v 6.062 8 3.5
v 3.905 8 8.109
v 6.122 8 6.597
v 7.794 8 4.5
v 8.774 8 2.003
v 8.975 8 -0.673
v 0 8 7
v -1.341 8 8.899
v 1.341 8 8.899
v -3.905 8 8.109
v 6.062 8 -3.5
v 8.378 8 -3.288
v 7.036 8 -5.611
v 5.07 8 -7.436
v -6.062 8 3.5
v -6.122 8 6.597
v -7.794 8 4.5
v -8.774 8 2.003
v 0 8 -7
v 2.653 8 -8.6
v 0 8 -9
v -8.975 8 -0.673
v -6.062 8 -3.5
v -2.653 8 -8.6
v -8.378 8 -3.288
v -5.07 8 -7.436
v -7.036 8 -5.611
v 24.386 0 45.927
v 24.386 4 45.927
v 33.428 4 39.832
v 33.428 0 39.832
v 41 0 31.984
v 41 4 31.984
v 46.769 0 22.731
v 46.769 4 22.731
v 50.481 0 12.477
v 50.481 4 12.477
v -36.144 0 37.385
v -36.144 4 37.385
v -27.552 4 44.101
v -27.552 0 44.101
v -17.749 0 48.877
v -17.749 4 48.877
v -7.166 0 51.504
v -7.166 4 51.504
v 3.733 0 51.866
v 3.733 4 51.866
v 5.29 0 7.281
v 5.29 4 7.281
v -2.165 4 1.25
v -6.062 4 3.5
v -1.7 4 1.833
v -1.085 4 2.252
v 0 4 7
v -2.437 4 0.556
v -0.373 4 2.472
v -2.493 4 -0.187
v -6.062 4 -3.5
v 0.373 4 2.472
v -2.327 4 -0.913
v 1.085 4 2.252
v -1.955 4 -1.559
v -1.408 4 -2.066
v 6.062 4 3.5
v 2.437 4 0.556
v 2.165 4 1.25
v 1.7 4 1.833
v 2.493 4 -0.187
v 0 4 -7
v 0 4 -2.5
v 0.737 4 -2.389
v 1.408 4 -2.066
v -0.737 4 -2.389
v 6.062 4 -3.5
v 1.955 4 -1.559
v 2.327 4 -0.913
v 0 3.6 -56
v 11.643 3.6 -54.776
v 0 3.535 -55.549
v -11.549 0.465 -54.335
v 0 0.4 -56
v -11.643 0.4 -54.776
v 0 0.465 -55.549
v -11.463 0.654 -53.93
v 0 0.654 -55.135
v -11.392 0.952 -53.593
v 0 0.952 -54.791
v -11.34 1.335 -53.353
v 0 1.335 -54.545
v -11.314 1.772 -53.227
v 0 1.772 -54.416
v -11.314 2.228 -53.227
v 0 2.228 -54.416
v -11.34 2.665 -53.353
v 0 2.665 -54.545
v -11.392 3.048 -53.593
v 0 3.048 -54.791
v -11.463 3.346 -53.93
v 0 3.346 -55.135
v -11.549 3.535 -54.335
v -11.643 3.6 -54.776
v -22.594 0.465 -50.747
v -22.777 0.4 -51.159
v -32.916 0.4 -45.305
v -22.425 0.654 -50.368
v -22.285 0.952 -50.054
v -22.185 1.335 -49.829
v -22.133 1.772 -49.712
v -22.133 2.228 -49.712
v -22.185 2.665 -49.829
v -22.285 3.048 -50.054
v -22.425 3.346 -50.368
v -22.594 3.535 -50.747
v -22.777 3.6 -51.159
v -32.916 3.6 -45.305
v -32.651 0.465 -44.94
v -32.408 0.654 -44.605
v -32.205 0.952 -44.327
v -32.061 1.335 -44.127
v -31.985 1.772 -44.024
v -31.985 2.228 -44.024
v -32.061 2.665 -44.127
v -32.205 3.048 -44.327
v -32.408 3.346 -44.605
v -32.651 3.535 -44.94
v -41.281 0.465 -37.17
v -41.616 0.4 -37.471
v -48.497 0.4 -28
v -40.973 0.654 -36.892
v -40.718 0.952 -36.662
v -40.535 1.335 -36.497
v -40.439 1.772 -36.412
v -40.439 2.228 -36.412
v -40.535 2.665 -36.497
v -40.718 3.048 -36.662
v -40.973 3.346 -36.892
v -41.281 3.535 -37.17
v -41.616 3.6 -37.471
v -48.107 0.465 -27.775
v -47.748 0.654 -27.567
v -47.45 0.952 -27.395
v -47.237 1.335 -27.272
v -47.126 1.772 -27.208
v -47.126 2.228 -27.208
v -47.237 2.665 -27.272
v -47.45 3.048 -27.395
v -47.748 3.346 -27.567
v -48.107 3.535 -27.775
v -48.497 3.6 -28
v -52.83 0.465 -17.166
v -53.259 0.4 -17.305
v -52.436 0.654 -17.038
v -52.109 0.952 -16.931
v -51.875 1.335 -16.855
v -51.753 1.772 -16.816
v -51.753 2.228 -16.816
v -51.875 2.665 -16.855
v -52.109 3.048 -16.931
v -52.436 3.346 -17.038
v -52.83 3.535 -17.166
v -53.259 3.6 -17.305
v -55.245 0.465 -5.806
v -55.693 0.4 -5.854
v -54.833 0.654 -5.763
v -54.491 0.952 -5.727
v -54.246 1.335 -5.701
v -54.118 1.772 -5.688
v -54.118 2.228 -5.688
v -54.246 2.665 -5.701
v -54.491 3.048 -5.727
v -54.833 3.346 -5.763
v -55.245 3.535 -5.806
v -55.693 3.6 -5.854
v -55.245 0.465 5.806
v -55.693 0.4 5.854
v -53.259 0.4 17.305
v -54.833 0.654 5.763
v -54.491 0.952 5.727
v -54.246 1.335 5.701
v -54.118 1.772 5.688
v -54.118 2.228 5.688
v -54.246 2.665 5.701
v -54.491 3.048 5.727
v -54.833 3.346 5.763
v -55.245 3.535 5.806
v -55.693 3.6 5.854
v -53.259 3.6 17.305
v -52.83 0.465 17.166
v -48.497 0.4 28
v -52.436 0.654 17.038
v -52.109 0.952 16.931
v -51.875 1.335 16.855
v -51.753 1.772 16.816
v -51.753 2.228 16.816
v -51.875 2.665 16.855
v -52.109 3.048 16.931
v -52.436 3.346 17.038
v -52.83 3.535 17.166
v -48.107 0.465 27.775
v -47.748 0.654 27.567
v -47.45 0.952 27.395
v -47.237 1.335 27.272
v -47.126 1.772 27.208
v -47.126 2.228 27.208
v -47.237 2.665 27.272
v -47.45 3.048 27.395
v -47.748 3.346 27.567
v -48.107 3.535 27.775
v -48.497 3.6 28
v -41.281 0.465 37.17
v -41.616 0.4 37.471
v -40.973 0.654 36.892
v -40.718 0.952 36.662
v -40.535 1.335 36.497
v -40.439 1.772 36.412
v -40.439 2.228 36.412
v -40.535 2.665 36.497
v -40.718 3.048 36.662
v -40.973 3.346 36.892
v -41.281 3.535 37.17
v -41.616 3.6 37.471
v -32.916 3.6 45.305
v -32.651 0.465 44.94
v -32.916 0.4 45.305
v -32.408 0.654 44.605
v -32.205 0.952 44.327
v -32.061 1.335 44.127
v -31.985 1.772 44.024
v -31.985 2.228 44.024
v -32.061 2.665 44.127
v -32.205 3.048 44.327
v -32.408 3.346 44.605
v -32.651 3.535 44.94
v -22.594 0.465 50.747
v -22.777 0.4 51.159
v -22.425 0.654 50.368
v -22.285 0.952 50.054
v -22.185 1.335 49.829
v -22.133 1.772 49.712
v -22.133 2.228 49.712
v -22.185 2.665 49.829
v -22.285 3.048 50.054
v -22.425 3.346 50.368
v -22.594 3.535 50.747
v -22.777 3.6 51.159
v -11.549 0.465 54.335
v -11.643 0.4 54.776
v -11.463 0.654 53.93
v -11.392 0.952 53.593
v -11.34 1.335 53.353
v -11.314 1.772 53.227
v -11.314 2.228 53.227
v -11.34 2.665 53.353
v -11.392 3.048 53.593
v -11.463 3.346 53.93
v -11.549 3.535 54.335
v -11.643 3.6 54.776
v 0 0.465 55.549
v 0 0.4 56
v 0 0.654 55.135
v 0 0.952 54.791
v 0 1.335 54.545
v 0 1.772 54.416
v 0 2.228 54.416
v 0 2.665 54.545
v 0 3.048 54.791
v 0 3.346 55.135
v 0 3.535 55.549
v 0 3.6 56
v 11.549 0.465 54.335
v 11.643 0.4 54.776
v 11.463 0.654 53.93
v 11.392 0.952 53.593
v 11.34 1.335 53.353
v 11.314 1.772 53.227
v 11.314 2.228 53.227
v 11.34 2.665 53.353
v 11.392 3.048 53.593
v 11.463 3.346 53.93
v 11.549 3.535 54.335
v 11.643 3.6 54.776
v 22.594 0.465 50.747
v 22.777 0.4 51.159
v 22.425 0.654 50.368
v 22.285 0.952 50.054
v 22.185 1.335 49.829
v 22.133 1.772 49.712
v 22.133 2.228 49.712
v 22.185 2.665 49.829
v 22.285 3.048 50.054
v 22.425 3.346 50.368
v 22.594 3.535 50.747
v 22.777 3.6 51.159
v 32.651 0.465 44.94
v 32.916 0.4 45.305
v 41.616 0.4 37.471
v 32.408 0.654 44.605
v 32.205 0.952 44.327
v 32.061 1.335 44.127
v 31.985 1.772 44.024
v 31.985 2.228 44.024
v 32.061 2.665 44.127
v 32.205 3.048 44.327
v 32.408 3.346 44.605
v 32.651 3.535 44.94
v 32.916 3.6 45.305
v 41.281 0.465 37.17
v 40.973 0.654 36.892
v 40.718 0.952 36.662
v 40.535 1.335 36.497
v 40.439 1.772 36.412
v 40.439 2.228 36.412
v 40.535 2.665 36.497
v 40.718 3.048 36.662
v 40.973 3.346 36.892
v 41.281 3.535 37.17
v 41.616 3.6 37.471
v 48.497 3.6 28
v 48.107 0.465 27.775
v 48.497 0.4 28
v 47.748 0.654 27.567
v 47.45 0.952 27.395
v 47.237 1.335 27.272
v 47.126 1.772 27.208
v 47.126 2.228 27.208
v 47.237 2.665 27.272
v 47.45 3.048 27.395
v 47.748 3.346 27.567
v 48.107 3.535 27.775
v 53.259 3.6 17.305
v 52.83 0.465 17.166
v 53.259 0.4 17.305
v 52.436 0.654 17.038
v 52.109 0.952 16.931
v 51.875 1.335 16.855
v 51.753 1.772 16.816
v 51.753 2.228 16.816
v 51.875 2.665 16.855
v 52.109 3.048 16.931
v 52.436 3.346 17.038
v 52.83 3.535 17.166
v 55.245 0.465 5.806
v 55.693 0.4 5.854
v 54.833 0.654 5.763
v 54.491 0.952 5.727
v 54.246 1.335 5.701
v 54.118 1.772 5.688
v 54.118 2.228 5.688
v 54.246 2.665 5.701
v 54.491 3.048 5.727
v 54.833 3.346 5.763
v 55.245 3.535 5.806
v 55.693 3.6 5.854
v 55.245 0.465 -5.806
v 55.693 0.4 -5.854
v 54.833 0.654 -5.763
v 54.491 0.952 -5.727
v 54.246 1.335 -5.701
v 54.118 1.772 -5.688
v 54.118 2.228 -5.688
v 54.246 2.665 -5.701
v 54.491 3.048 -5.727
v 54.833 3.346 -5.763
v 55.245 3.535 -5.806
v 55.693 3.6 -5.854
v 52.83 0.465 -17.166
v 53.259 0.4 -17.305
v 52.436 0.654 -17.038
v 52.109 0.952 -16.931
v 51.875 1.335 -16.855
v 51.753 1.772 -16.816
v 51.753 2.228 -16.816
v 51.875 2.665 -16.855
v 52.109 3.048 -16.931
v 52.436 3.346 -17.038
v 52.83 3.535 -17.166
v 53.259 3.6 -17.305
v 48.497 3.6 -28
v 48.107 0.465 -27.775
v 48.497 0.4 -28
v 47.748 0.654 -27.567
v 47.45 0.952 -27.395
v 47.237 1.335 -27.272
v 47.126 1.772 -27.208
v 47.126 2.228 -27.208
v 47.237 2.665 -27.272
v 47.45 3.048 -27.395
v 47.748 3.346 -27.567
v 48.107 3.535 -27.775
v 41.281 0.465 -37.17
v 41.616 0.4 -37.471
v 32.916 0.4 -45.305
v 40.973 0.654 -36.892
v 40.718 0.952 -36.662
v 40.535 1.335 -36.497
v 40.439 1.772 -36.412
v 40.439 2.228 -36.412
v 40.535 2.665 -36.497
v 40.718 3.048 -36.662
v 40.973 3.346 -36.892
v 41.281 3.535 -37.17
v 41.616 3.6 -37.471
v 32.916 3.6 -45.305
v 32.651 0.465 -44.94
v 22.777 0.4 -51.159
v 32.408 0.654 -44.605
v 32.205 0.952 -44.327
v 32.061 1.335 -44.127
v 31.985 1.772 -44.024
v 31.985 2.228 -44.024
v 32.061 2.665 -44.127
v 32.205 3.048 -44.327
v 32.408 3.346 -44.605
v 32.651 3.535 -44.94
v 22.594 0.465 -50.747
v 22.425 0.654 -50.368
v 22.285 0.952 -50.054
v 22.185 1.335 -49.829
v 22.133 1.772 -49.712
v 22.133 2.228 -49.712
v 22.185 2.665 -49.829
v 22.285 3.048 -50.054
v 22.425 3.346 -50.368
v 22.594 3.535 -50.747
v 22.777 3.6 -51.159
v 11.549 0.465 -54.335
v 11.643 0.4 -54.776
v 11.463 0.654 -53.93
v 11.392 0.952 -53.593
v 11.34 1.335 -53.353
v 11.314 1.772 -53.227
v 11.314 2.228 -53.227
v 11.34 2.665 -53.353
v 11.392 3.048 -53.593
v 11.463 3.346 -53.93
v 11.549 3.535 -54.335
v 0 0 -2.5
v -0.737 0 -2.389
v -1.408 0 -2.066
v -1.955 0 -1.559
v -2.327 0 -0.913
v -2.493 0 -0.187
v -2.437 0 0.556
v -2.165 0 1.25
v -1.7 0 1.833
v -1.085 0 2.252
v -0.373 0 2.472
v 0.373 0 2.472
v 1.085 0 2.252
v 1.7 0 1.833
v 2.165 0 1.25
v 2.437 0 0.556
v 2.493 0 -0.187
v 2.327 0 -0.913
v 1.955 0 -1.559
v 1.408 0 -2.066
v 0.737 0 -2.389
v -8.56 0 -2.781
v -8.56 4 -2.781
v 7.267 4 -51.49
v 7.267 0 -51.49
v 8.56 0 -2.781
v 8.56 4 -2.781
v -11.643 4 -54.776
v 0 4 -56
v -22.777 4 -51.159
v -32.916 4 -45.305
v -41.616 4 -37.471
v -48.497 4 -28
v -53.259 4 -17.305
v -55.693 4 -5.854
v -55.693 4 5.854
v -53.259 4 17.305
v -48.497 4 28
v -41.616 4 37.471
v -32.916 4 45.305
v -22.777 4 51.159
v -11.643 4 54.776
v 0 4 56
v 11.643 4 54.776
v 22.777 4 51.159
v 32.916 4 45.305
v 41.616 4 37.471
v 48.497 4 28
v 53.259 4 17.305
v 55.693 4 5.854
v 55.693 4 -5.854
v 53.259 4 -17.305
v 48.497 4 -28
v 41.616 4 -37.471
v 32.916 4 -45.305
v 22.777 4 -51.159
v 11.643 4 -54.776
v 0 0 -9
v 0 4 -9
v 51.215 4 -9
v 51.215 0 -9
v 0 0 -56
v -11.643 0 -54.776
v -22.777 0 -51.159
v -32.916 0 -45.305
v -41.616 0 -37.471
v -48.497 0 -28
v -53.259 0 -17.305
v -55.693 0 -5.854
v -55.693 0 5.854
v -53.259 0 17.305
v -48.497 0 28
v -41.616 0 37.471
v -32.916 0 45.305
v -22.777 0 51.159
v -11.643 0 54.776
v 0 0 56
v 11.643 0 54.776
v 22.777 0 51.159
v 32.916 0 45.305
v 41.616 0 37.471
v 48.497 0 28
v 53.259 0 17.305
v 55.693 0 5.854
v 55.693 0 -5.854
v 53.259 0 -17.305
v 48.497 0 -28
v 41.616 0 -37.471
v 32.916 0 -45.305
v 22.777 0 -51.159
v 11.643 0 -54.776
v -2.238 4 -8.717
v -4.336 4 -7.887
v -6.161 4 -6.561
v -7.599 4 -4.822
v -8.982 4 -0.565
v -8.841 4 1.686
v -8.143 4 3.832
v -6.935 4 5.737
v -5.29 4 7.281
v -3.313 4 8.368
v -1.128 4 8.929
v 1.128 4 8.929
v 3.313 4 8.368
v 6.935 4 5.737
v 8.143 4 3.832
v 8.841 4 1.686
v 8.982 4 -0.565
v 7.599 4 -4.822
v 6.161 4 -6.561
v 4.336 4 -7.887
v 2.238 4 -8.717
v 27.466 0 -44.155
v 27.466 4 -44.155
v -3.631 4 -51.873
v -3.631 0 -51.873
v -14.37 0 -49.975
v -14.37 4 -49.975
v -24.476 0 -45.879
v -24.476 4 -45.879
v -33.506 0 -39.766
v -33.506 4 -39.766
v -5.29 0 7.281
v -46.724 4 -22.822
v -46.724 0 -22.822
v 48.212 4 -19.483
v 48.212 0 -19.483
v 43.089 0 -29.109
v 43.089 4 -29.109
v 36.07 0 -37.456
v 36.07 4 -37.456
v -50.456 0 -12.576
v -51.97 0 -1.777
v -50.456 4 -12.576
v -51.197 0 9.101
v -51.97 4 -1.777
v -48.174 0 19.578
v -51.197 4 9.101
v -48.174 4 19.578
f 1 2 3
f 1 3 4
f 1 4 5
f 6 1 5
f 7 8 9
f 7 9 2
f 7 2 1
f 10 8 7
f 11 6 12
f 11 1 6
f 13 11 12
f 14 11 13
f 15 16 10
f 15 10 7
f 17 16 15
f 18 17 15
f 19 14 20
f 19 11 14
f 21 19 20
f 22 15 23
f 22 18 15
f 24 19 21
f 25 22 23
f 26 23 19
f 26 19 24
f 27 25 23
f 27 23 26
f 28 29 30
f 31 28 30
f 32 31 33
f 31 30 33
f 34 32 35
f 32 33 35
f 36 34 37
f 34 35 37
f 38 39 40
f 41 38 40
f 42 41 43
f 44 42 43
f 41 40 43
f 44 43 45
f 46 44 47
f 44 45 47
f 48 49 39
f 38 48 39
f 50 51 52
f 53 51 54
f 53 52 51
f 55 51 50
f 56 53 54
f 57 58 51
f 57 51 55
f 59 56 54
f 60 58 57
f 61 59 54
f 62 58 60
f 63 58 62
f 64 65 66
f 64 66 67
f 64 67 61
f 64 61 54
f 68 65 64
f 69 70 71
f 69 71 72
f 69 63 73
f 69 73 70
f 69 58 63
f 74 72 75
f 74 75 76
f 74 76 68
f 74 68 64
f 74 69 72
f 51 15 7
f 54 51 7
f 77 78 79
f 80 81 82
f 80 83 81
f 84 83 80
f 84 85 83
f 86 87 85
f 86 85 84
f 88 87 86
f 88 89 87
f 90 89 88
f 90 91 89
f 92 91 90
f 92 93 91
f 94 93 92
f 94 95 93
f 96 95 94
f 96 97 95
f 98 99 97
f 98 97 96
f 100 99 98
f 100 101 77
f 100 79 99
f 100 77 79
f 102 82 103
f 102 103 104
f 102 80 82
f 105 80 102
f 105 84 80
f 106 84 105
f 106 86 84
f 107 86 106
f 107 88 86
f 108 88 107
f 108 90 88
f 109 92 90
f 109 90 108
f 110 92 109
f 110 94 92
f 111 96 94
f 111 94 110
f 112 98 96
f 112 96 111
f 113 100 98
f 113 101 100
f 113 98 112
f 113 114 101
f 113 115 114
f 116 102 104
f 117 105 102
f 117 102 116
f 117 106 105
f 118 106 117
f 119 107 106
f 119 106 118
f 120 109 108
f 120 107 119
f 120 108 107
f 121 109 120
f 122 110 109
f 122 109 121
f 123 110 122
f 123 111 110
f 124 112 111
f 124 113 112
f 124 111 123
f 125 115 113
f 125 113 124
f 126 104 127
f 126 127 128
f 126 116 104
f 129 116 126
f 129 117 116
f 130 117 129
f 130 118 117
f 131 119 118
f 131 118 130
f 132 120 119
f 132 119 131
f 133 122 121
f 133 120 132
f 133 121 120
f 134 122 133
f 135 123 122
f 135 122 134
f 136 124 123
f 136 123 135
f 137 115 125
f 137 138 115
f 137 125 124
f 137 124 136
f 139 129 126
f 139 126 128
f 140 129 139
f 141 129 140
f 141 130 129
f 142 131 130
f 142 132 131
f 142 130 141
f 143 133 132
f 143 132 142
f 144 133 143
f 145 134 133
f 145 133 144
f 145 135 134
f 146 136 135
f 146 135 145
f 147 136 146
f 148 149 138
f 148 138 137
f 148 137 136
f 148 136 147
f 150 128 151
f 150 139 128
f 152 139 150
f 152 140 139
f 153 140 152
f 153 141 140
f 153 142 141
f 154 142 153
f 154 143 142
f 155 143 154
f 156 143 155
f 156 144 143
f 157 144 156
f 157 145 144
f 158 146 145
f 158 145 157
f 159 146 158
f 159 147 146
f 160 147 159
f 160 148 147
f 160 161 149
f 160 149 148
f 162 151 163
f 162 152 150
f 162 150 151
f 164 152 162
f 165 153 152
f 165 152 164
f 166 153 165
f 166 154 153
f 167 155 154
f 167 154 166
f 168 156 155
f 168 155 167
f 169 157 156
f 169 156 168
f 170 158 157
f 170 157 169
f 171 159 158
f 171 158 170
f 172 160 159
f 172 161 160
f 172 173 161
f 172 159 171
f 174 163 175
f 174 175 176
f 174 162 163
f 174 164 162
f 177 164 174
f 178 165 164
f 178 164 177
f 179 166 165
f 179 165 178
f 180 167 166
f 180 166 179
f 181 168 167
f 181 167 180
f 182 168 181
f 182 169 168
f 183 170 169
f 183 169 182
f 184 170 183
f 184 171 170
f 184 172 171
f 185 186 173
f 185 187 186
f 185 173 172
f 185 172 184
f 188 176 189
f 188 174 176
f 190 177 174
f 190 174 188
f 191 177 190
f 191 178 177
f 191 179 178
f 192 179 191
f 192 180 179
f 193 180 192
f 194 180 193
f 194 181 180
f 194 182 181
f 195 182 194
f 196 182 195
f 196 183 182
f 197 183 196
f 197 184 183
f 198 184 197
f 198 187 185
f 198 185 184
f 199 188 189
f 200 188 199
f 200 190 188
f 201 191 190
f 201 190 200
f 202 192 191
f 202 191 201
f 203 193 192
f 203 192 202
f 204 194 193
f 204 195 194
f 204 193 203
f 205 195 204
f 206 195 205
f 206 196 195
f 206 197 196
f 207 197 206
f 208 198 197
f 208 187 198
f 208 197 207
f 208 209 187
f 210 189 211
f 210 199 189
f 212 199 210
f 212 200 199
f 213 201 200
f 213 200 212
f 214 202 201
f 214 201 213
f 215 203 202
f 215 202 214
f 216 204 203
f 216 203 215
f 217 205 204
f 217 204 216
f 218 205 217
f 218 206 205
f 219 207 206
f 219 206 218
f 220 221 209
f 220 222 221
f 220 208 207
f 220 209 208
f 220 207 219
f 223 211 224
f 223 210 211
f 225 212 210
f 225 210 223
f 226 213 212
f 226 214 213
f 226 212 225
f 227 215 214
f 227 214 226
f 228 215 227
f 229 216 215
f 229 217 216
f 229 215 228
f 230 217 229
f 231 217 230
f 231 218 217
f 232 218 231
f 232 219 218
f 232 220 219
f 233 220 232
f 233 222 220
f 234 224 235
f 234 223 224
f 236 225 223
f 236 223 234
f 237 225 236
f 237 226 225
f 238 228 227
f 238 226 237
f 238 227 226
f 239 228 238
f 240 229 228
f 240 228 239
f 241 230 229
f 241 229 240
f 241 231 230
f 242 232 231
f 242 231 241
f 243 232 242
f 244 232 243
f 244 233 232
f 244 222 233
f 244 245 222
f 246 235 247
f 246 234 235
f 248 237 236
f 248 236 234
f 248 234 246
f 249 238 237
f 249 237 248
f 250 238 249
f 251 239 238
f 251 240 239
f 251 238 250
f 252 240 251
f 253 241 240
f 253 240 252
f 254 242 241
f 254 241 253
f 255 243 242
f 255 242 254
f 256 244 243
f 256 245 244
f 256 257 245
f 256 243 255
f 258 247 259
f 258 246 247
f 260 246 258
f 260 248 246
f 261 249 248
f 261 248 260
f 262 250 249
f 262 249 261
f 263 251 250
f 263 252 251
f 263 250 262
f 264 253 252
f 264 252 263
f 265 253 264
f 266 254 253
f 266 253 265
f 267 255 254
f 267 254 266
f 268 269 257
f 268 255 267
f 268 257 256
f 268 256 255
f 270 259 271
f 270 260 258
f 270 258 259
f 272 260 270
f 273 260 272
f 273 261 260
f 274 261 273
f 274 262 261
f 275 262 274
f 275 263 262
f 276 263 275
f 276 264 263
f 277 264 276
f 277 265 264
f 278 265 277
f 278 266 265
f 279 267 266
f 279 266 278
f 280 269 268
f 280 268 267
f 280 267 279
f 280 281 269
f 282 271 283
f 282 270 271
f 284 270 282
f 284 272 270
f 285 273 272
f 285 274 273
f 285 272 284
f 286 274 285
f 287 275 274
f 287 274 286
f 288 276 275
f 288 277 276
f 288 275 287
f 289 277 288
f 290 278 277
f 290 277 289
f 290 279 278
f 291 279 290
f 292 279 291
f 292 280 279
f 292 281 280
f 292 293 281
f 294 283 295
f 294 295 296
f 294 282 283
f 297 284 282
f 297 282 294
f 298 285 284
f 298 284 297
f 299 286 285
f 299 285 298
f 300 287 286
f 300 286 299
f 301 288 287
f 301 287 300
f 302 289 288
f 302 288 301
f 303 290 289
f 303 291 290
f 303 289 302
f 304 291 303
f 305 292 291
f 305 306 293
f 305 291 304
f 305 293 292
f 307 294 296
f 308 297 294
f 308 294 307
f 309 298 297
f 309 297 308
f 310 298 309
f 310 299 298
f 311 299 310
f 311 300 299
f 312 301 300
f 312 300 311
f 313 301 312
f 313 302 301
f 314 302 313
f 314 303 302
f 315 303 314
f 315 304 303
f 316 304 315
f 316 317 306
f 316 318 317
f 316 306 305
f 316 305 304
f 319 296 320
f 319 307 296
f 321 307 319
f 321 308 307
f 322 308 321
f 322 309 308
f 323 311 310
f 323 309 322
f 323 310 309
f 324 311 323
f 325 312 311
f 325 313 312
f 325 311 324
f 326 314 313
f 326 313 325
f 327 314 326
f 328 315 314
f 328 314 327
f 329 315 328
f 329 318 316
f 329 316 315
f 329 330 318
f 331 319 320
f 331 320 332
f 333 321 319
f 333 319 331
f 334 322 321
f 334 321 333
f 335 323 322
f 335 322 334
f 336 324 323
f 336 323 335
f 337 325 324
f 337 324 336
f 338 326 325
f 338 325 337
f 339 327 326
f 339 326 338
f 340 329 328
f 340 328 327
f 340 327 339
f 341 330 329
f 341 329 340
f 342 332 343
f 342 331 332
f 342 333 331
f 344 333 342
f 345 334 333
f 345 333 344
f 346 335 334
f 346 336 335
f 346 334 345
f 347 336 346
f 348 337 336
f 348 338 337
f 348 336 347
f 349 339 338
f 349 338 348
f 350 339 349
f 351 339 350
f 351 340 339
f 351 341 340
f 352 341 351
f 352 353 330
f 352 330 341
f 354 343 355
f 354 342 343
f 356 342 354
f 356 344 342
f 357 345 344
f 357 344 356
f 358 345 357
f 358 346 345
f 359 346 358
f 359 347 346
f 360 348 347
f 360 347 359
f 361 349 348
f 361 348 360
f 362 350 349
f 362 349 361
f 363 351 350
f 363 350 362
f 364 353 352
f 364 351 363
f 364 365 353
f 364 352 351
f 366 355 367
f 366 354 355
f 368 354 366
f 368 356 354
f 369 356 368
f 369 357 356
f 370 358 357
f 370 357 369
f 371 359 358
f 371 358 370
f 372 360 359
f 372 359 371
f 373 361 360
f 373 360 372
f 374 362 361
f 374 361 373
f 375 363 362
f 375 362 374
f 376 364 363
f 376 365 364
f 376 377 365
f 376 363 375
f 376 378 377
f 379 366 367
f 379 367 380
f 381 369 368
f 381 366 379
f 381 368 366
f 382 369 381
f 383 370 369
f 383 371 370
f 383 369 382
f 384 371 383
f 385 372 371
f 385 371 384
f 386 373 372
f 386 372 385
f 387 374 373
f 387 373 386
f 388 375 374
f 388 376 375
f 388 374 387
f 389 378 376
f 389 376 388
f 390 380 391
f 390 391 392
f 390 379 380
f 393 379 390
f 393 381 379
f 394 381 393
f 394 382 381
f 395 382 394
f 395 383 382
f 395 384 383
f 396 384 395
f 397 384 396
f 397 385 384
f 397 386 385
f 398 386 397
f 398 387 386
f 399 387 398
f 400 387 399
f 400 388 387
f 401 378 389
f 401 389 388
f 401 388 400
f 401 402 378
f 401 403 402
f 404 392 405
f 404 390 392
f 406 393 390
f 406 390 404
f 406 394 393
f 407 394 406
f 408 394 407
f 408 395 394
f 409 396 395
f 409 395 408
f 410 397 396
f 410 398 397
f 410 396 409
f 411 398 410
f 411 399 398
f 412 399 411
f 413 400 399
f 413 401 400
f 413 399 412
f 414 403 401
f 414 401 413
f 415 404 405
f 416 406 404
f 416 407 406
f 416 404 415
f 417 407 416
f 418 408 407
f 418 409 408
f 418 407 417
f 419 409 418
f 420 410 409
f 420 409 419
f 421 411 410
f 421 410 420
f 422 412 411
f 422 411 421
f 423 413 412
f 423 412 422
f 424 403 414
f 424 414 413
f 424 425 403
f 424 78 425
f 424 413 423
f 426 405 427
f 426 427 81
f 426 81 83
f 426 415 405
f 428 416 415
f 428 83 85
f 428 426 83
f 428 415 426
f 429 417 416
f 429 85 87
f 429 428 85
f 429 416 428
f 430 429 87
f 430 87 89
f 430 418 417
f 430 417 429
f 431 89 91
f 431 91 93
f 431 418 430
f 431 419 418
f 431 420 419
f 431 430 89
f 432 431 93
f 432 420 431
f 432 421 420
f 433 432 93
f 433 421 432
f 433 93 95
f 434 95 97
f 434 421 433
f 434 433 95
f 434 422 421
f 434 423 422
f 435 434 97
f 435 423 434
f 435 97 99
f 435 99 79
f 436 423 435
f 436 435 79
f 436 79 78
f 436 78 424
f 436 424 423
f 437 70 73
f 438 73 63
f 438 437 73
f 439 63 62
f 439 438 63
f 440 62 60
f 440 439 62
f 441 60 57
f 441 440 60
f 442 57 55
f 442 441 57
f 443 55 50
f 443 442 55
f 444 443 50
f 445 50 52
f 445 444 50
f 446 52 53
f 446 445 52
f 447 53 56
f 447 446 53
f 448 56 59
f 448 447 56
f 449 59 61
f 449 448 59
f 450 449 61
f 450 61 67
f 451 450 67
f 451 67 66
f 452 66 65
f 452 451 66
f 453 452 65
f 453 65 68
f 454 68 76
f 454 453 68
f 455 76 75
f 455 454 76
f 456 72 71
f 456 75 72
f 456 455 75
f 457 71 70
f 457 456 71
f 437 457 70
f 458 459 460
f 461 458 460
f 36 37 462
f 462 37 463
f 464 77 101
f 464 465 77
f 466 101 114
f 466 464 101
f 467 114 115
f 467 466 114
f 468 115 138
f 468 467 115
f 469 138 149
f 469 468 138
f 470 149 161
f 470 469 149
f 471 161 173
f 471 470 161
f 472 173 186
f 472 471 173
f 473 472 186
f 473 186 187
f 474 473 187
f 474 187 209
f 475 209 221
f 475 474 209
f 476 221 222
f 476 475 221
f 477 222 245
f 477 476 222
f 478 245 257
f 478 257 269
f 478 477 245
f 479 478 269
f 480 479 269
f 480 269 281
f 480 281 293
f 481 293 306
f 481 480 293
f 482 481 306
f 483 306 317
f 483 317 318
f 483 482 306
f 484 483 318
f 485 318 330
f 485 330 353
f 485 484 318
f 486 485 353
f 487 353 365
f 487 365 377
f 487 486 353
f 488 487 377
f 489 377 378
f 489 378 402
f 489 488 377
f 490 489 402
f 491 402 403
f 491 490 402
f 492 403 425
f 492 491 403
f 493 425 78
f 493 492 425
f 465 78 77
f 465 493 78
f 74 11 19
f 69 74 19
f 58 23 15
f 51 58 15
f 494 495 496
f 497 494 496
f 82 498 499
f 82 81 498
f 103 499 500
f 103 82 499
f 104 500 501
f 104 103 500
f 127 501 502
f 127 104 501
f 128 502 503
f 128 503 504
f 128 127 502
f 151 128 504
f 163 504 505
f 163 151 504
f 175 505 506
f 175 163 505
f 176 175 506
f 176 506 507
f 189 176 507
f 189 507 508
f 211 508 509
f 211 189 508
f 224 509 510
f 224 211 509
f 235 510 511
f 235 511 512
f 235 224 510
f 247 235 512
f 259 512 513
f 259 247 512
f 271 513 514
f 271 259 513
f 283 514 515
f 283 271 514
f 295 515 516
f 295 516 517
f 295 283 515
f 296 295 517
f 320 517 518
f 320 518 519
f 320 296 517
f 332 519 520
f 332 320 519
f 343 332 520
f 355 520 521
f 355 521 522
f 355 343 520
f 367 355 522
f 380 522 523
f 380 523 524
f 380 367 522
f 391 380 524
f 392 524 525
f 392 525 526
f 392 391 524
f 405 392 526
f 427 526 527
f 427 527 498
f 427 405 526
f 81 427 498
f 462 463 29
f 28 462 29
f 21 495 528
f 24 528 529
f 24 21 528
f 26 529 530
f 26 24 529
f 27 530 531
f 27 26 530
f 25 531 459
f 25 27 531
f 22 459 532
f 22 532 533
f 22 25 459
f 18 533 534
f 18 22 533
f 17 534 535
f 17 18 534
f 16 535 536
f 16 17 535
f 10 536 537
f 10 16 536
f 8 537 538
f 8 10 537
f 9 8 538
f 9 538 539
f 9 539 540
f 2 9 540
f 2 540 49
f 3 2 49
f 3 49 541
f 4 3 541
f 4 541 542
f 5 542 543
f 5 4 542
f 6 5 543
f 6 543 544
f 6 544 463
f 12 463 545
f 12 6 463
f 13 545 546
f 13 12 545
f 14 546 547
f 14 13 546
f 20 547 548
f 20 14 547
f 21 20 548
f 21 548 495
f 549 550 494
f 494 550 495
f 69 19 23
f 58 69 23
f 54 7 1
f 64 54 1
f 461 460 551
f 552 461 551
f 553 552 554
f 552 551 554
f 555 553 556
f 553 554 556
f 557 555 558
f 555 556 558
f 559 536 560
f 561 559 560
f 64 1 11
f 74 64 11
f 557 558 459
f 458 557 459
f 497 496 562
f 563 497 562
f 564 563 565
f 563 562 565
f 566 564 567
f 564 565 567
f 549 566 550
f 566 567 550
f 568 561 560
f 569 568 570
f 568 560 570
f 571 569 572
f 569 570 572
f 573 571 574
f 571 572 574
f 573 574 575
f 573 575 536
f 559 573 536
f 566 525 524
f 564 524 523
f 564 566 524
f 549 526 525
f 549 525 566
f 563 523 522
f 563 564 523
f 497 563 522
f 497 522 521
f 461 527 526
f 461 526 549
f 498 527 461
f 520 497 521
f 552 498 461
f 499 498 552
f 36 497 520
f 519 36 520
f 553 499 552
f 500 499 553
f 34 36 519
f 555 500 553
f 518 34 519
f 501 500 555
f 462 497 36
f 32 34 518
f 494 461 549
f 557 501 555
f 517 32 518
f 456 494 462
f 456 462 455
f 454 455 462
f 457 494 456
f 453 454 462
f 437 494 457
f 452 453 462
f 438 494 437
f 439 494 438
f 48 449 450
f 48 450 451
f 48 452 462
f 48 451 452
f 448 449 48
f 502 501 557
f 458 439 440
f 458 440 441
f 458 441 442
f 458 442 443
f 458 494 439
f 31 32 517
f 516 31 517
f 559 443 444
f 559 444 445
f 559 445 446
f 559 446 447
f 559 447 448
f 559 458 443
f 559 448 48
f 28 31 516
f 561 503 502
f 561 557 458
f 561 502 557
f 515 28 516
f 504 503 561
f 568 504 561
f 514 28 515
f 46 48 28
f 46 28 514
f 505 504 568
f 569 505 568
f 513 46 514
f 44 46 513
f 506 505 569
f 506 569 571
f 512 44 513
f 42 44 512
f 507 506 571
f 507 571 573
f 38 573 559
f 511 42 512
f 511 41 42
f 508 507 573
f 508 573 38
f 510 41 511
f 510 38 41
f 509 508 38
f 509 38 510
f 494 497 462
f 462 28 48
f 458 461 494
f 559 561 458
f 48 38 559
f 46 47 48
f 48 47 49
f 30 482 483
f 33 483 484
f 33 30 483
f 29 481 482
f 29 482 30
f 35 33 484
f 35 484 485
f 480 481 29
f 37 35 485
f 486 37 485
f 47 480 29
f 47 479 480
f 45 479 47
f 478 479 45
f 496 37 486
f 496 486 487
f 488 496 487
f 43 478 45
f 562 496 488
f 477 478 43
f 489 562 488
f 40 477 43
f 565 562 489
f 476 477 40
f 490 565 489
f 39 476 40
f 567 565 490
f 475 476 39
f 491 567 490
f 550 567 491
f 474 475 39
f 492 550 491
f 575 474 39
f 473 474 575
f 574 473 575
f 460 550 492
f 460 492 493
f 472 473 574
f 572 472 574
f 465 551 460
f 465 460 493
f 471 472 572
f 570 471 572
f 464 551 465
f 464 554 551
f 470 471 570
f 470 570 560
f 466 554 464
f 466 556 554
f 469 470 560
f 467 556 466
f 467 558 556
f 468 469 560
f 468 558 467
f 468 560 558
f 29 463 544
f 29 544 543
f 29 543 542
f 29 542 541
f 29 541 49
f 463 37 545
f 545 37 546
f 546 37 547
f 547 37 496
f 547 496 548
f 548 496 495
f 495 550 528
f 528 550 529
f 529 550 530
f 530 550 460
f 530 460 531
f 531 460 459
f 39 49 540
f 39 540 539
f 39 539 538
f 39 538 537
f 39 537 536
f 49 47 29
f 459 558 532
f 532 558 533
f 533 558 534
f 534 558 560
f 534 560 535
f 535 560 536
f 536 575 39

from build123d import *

# Parameters (mm, degrees)
CUT_EXTRUDE_1_DEPTH = 80.296910406
CUT_EXTRUDE_2_DEPTH = 4


with BuildPart() as part:
    # 草图1 → 旋转1 (revolve)
    with BuildSketch(Plane.XY):
        with BuildLine():
            Line((9, 8), (2.5, 8))
            Line((2.5, 8), (2.5, 0))
            Line((2.5, 0), (56, 0))
            Line((56, 0), (56, 0.4))
            ThreePointArc((56, 0.4), (54.4, 2), (56, 3.6))
            Line((56, 3.6), (56, 4))
            Line((56, 4), (9, 4))
            Line((9, 4), (9, 8))
        make_face()
    revolve(axis=Axis((0, 4, 0), (0, 1, 0)))

    # 草图2 → 切除-拉伸1 (cut, through all)
    with BuildSketch(Plane(origin=(0, 4, 0), x_dir=(1, 0, 0), z_dir=(0, 1, 0))):
        with BuildLine():
            Line((27.465795744, 44.154615434), (0, 9))
            Line((0, 9), (51.215232109, 9))
            ThreePointArc((51.215232109, 9), (43.0887199, 29.109486725), (27.465795744, 44.154615434))
        make_face()
        with BuildLine():
            Line((-8.559508647, 2.781152949), (7.266868446, 51.48973318))
            ThreePointArc((7.266868446, 51.48973318), (-14.369620321, 49.975133935), (-33.506137084, 39.766050567))
            Line((-33.506137084, 39.766050567), (-8.559508647, 2.781152949))
        make_face()
        with BuildLine():
            ThreePointArc((24.385885739, -45.927427282), (40.999913751, -31.984481744), (50.480932382, -12.476997468))
            Line((50.480932382, -12.476997468), (8.559508647, 2.781152949))
            Line((8.559508647, 2.781152949), (24.385885739, -45.927427282))
        make_face()
        with BuildLine():
            Line((-5.290067271, -7.281152949), (-46.724060418, 22.822405177))
            ThreePointArc((-46.724060418, 22.822405177), (-51.969633664, 1.776844639), (-48.173727294, -19.577844585))
            Line((-48.173727294, -19.577844585), (-5.290067271, -7.281152949))
        make_face()
        with BuildLine():
            ThreePointArc((-36.143925877, -37.384711076), (-17.749379666, -48.876983555), (3.733136252, -51.865823947))
            Line((3.733136252, -51.865823947), (5.290067271, -7.281152949))
            Line((5.290067271, -7.281152949), (-36.143925877, -37.384711076))
        make_face()
    extrude(amount=-CUT_EXTRUDE_1_DEPTH, mode=Mode.SUBTRACT)

    # 草图3 → 切除-拉伸2 (cut)
    with BuildSketch(Plane(origin=(0, 8, 0), x_dir=(1, 0, 0), z_dir=(0, 1, 0))):
        Polygon((0, 7), (-6.062177826, 3.5), (-6.062177826, -3.5), (0, -7), (6.062177826, -3.5), (6.062177826, 3.5), align=None)
    extrude(amount=-CUT_EXTRUDE_2_DEPTH, mode=Mode.SUBTRACT)


solid = part.part
